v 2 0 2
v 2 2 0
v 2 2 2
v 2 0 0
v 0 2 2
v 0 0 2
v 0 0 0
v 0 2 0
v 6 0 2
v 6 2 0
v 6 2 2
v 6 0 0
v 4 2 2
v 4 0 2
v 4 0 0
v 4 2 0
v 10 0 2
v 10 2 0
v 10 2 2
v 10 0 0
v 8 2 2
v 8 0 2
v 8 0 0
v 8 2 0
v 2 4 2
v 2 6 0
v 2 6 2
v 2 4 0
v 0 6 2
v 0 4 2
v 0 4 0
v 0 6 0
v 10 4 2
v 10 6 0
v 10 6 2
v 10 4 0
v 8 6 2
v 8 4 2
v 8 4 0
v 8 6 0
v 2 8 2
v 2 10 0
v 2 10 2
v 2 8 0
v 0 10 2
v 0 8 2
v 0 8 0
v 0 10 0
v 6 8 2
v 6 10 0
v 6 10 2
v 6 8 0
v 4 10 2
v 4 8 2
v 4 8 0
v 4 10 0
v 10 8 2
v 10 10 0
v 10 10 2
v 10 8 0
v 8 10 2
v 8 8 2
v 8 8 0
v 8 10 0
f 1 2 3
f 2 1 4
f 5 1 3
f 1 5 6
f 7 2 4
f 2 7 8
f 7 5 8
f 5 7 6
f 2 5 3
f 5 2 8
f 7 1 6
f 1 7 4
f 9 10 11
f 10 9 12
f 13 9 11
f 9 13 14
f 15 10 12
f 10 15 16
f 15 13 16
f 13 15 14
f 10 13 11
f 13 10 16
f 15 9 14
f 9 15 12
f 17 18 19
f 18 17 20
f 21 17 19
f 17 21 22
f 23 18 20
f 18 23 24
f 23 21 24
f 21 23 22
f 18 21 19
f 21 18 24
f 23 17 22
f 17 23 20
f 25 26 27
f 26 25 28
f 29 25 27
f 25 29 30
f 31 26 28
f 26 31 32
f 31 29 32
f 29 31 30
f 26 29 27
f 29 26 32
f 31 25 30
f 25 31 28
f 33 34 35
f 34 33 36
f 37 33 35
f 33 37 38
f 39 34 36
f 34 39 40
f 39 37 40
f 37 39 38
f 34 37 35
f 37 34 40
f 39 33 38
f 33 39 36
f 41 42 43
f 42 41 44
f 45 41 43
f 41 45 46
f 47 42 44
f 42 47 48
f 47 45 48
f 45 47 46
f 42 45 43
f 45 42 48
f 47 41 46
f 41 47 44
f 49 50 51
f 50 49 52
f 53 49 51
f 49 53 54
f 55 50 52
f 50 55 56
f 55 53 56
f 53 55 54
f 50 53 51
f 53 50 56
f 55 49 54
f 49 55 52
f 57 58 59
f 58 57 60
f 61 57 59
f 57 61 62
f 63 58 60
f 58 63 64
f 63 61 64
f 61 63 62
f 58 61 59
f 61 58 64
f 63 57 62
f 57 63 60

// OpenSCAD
union() {
  translate([0, 0, 0]) cube(size=[2,2,2], center=false);
  translate([4, 0, 0]) cube(size=[2,2,2], center=false);
  translate([8, 0, 0]) cube(size=[2,2,2], center=false);

  translate([0, 4, 0]) cube(size=[2,2,2], center=false);
  translate([8, 4, 0]) cube(size=[2,2,2], center=false);

  translate([0, 8, 0]) cube(size=[2,2,2], center=false);
  translate([4, 8, 0]) cube(size=[2,2,2], center=false);
  translate([8, 8, 0]) cube(size=[2,2,2], center=false);
}
